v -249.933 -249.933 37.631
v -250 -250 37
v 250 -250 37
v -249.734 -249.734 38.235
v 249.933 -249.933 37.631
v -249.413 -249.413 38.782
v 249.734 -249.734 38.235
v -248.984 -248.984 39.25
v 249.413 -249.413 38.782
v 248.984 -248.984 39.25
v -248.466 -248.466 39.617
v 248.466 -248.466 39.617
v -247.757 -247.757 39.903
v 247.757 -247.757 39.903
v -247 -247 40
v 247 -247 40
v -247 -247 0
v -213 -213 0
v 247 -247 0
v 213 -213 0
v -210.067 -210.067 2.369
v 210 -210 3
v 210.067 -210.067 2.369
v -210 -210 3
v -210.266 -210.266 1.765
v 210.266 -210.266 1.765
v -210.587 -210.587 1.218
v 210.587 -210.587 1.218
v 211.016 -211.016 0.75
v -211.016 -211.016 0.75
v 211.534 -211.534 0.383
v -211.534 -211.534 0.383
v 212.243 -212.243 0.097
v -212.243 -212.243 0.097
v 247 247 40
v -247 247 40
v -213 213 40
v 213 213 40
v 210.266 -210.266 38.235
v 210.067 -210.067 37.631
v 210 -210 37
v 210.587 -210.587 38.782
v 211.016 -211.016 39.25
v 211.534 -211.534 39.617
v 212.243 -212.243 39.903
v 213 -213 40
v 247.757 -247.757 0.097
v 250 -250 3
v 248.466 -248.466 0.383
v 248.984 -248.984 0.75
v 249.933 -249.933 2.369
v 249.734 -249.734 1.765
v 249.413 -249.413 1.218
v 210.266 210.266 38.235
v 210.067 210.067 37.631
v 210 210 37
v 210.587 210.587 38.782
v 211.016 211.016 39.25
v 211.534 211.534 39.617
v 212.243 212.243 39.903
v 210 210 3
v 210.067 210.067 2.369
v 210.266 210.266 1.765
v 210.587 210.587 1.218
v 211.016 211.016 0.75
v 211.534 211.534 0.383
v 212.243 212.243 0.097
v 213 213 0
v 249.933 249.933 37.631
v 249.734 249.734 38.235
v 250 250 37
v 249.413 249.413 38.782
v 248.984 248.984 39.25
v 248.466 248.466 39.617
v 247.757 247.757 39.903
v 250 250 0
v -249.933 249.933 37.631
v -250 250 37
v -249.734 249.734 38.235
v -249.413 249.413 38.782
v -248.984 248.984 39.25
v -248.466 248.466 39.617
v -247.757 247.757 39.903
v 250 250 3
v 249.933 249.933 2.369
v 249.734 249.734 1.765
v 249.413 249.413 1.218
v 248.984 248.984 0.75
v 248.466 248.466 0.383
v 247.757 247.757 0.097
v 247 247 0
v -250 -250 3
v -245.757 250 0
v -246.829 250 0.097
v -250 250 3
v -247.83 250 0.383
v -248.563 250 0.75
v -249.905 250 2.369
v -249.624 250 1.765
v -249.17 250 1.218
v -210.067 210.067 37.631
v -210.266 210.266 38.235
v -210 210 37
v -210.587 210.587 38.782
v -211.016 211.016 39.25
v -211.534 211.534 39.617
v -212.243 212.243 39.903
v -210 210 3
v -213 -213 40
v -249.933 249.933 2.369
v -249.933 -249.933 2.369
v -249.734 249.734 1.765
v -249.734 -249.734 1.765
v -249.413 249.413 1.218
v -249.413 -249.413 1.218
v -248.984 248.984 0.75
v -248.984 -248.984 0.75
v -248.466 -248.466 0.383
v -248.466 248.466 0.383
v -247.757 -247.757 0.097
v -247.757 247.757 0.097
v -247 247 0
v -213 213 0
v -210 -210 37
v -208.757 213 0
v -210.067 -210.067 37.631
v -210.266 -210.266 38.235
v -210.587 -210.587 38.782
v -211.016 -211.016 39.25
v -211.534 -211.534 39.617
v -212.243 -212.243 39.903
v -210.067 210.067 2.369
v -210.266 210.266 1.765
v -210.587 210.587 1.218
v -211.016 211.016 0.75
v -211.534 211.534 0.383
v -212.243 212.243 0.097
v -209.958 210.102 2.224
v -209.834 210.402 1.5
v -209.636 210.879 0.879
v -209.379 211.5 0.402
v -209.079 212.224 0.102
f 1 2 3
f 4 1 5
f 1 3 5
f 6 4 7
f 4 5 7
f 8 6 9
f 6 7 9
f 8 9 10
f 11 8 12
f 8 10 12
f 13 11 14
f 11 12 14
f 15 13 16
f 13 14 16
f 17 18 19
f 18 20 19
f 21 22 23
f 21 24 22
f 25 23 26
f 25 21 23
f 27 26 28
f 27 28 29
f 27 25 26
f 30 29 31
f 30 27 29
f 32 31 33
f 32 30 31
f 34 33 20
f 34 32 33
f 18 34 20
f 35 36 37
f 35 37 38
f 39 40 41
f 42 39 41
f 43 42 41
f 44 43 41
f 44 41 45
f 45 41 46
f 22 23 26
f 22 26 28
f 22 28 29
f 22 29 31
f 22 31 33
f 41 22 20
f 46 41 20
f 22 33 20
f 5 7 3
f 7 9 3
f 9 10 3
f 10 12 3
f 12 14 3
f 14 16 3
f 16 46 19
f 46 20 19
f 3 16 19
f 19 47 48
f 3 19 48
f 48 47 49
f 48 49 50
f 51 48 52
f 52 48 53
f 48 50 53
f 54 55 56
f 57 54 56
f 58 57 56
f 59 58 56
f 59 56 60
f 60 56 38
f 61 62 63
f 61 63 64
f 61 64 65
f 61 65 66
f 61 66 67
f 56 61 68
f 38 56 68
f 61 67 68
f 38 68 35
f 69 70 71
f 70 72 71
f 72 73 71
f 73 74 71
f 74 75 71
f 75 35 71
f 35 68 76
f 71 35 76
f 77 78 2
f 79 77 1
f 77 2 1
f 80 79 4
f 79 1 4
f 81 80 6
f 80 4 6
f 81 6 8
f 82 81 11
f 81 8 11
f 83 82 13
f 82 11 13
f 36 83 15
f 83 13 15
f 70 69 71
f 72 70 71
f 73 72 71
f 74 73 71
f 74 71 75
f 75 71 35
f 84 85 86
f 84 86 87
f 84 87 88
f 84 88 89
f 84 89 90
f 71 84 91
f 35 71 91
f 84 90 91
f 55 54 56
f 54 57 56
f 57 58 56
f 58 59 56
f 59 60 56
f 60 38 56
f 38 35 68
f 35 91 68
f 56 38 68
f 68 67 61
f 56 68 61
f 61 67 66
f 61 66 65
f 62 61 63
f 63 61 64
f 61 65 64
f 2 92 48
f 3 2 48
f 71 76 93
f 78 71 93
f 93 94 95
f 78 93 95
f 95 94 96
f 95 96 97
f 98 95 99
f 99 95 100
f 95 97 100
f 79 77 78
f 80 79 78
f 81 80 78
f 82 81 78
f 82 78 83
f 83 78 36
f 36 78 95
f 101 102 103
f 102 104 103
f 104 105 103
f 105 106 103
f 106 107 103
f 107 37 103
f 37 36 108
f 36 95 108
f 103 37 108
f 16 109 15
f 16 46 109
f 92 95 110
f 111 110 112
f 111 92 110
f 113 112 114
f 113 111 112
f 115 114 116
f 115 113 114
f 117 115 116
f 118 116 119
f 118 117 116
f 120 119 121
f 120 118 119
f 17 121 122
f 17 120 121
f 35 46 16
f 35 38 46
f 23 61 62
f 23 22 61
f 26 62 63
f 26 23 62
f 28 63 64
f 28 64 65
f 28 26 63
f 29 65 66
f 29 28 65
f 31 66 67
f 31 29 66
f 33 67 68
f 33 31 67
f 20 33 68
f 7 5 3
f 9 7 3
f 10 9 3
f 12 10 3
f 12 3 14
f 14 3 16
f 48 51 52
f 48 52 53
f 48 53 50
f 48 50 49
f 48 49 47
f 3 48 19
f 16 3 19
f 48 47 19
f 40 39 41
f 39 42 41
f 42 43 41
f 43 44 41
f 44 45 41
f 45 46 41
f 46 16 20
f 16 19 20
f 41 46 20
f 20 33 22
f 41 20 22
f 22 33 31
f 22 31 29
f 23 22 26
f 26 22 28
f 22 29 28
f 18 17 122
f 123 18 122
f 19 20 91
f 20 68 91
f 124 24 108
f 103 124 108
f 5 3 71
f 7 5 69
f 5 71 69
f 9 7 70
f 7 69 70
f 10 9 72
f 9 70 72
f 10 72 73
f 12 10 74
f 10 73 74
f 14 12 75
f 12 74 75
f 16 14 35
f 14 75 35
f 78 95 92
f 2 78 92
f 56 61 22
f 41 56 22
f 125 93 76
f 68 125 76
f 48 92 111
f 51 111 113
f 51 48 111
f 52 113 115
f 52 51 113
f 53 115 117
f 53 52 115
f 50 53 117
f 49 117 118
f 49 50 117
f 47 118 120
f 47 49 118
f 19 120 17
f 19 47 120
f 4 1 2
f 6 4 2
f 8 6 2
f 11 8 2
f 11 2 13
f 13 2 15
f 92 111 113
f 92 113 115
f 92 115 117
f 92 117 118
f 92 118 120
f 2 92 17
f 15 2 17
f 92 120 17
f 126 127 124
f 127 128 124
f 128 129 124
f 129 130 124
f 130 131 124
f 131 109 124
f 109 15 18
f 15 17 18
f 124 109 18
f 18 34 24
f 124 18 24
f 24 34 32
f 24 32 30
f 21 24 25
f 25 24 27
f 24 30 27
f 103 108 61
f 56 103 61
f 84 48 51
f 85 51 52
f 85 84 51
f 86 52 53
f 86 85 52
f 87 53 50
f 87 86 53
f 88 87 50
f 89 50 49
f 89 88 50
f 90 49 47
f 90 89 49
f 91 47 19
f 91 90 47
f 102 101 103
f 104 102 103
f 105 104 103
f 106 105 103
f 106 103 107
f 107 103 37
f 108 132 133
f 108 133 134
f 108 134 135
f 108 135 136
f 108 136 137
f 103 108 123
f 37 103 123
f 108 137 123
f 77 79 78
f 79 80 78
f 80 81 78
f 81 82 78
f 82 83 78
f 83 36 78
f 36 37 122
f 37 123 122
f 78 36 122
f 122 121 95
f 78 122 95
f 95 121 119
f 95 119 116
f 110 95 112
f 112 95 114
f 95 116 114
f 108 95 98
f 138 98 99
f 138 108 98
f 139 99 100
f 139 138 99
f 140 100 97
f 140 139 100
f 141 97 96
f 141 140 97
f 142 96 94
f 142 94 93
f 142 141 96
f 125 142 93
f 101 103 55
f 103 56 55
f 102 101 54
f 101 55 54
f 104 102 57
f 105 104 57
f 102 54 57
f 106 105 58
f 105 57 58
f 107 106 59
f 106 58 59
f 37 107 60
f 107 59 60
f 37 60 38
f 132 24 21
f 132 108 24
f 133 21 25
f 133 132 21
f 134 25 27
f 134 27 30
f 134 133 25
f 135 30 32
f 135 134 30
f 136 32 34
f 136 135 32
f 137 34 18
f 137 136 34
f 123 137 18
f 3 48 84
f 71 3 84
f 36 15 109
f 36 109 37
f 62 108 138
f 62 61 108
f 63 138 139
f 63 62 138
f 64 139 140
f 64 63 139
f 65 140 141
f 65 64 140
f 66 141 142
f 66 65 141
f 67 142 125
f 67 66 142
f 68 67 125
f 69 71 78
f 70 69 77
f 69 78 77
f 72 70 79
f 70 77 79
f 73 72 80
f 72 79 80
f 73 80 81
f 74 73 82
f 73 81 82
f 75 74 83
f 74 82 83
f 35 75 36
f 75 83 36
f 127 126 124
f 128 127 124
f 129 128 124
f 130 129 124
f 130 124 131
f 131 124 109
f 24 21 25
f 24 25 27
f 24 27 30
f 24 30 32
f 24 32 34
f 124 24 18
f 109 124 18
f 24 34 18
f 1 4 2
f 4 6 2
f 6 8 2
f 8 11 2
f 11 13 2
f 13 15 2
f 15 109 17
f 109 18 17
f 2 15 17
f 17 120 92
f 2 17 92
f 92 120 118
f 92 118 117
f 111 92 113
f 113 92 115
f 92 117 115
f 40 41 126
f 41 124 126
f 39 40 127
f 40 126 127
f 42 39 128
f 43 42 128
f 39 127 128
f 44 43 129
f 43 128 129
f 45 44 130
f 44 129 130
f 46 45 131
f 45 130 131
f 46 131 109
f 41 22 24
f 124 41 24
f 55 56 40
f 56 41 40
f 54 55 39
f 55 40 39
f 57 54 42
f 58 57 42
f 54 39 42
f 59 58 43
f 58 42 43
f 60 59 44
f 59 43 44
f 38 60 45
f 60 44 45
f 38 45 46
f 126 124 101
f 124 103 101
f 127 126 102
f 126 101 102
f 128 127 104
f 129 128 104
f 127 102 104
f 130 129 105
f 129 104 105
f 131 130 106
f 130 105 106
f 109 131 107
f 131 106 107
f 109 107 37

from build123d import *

# Parameters (mm, degrees)
F1_DEPTH  = 40
F2_R      = 3
F4_DEPTH  = 40
F5_R      = 3
F7_DEPTH  = 40
F8_R      = 3
F10_DEPTH = 40
F11_R     = 3


with BuildPart() as f1:
    # F0 (on Top) → F1 (new body)
    with BuildSketch(Plane.XY):
        Polygon((250.000002, 250), (-249.999998, 250), (-209.999998, 210), (210.000002, 210), align=None)
    extrude(amount=F1_DEPTH)

    # F2
    f2_edges = [f1.edges().sort_by_distance(p)[0] for p in [
        (2e-06, 250, 40),
        (2e-06, 210, 40),
        (2e-06, 210, 0),
        (-229.999998, 230, 0),
    ]]
    fillet(f2_edges, radius=F2_R)


with BuildPart() as f4:
    # F3 (on Top) → F4 (new body)
    with BuildSketch(Plane.XY):
        Polygon((-209.999998, 210), (-249.999998, 250), (-249.999998, -250), (-209.999998, -210), align=None)
    extrude(amount=F4_DEPTH)

    # F5
    f5_edges = [f4.edges().sort_by_distance(p)[0] for p in [
        (-209.999998, 0, 40),
        (-209.999998, 0, 0),
        (-249.999998, 0, 40),
        (-249.999998, 0, 0),
    ]]
    fillet(f5_edges, radius=F5_R)


with BuildPart() as f7:
    # F6 (on Top) → F7 (new body)
    with BuildSketch(Plane.XY):
        Polygon((-209.999998, -210), (-249.999998, -250), (250.000002, -250), (210.000002, -210), align=None)
    extrude(amount=F7_DEPTH)

    # F8
    f8_edges = [f7.edges().sort_by_distance(p)[0] for p in [
        (2e-06, -250, 40),
        (2e-06, -210, 40),
        (2e-06, -250, 0),
        (2e-06, -210, 0),
    ]]
    fillet(f8_edges, radius=F8_R)


with BuildPart() as f10:
    # F9 (on Top) → F10 (new body)
    with BuildSketch(Plane.XY):
        Polygon((210.000002, -210), (250.000002, -250), (250.000002, 250), (210.000002, 210), align=None)
    extrude(amount=F10_DEPTH)

    # F11
    f11_edges = [f10.edges().sort_by_distance(p)[0] for p in [
        (210.000002, 0, 40),
        (250.000002, 0, 40),
        (250.000002, 0, 0),
        (210.000002, 0, 0),
    ]]
    fillet(f11_edges, radius=F11_R)


solid = Compound([f1.part, f4.part, f7.part, f10.part])
